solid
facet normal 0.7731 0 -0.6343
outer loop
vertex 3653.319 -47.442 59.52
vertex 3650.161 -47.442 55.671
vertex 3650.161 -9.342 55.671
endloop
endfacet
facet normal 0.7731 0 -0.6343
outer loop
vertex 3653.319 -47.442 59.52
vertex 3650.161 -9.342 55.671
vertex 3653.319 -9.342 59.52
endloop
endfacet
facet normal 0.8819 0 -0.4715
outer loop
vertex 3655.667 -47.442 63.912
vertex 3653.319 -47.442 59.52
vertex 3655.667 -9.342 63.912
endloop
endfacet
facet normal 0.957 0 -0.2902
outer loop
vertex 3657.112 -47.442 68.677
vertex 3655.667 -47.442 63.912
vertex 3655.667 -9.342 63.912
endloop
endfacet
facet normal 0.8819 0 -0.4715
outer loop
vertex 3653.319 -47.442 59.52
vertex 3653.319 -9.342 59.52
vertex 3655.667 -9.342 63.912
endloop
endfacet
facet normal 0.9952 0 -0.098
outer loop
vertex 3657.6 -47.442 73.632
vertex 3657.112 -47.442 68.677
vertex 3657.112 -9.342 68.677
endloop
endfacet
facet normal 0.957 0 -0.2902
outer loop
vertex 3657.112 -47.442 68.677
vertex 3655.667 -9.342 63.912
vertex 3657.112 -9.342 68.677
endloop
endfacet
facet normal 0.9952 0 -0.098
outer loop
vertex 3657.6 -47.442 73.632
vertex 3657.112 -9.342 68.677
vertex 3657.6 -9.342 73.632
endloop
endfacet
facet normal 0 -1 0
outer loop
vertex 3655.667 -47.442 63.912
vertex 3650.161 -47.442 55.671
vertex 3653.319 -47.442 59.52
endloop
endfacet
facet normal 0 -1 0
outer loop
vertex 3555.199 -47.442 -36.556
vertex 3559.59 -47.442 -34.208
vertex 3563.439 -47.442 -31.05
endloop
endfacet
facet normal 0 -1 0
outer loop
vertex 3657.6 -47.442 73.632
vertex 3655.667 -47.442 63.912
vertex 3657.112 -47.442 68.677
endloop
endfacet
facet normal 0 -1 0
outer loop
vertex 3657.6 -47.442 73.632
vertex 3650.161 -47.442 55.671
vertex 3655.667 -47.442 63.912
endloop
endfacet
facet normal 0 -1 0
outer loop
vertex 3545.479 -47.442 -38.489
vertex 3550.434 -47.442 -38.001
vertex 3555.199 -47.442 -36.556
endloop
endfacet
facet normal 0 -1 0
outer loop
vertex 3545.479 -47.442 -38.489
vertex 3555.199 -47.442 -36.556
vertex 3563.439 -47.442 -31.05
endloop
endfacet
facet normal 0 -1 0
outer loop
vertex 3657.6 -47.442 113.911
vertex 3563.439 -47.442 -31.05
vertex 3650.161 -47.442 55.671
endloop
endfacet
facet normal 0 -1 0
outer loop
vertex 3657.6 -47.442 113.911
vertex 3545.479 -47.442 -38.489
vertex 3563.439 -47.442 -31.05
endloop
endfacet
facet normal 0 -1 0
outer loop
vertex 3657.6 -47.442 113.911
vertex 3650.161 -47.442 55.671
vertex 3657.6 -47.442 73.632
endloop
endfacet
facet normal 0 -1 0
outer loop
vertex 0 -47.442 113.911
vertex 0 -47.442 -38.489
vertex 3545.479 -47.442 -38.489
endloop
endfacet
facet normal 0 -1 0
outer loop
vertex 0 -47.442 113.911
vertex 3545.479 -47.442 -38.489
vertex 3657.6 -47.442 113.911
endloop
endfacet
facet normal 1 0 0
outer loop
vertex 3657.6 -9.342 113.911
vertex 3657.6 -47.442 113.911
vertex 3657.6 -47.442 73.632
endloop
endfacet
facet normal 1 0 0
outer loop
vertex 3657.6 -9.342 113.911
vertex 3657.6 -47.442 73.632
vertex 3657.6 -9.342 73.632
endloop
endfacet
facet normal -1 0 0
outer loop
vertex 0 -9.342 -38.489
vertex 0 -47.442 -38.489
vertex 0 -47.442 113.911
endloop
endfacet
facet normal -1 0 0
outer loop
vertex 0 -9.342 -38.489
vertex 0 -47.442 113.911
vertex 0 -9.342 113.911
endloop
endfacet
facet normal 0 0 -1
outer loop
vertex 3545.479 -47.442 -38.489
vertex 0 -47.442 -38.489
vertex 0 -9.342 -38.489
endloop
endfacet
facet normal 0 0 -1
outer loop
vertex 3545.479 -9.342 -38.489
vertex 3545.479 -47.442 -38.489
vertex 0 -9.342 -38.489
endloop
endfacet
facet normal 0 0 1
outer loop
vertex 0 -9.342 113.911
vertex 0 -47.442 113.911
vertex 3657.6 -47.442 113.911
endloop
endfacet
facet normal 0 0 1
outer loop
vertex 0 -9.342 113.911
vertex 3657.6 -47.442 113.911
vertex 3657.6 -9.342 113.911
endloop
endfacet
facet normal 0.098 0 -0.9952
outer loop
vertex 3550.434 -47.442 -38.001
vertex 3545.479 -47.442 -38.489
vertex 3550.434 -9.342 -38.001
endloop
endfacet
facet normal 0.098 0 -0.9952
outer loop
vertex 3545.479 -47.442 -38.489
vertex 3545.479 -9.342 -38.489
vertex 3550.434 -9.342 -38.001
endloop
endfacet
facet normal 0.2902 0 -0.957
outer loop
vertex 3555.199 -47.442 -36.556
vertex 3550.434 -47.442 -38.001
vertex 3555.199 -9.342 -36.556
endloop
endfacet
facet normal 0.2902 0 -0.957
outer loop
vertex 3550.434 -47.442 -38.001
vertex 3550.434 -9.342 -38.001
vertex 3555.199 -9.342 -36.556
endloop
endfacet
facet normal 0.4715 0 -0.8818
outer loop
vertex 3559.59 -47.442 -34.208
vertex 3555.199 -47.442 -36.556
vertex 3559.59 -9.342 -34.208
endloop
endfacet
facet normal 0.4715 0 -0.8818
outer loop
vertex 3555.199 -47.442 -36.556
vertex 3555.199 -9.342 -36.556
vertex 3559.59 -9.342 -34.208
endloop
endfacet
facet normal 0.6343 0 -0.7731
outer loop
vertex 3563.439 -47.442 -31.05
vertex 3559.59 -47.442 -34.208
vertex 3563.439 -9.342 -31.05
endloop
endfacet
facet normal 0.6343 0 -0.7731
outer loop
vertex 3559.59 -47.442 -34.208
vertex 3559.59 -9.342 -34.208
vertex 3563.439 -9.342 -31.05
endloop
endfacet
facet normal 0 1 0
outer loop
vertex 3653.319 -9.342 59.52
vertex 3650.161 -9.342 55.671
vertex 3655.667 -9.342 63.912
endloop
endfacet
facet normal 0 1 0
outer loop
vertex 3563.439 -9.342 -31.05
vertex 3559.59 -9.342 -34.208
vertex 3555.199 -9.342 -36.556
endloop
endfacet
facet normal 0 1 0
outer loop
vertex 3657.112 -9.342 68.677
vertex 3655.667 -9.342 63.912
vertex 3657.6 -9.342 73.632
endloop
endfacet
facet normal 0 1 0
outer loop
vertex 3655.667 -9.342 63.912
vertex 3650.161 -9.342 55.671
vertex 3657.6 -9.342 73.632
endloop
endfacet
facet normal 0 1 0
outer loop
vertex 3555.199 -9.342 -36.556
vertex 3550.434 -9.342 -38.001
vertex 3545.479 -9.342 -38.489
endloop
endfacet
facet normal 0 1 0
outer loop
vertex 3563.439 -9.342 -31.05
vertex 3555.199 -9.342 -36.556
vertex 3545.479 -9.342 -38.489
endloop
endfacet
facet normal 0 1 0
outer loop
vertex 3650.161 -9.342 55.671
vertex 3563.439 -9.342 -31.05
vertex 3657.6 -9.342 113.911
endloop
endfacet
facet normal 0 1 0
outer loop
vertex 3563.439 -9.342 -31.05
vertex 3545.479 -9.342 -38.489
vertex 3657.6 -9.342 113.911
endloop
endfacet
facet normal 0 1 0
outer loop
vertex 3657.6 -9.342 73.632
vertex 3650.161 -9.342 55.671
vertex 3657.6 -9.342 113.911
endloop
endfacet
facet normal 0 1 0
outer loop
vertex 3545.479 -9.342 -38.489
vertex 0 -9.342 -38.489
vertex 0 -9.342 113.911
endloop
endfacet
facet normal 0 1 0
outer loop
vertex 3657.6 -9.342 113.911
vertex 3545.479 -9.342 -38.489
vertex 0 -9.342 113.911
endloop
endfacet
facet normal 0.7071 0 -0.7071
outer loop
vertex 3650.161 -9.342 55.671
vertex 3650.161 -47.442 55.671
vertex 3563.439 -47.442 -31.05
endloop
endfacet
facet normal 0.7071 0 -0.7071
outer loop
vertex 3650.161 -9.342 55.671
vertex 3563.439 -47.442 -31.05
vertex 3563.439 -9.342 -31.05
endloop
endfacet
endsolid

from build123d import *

# Parameters (mm, degrees)
F0_W     = 38.1
F0_H     = 152.4
F1_DEPTH = 3657.6
F2_SIZE  = 101.6
F3_R     = 25.4


with BuildPart() as f1:
    # F0 (on Right) → F1 (new body)
    with BuildSketch(Plane.YZ):
        with Locations((-28.3922934905, 37.7108814793)):
            Rectangle(F0_W, F0_H)
    extrude(amount=F1_DEPTH)

    # F2
    f2_edges = [f1.edges().sort_by_distance(p)[0] for p in [
        (3657.6, -28.392293, -38.489119),
    ]]
    chamfer(f2_edges, length=F2_SIZE)

    # F3
    f3_edges = [f1.edges().sort_by_distance(p)[0] for p in [
        (3657.6, -28.392293, 63.110881),
        (3556, -28.392293, -38.489119),
    ]]
    fillet(f3_edges, radius=F3_R)


solid = f1.part
